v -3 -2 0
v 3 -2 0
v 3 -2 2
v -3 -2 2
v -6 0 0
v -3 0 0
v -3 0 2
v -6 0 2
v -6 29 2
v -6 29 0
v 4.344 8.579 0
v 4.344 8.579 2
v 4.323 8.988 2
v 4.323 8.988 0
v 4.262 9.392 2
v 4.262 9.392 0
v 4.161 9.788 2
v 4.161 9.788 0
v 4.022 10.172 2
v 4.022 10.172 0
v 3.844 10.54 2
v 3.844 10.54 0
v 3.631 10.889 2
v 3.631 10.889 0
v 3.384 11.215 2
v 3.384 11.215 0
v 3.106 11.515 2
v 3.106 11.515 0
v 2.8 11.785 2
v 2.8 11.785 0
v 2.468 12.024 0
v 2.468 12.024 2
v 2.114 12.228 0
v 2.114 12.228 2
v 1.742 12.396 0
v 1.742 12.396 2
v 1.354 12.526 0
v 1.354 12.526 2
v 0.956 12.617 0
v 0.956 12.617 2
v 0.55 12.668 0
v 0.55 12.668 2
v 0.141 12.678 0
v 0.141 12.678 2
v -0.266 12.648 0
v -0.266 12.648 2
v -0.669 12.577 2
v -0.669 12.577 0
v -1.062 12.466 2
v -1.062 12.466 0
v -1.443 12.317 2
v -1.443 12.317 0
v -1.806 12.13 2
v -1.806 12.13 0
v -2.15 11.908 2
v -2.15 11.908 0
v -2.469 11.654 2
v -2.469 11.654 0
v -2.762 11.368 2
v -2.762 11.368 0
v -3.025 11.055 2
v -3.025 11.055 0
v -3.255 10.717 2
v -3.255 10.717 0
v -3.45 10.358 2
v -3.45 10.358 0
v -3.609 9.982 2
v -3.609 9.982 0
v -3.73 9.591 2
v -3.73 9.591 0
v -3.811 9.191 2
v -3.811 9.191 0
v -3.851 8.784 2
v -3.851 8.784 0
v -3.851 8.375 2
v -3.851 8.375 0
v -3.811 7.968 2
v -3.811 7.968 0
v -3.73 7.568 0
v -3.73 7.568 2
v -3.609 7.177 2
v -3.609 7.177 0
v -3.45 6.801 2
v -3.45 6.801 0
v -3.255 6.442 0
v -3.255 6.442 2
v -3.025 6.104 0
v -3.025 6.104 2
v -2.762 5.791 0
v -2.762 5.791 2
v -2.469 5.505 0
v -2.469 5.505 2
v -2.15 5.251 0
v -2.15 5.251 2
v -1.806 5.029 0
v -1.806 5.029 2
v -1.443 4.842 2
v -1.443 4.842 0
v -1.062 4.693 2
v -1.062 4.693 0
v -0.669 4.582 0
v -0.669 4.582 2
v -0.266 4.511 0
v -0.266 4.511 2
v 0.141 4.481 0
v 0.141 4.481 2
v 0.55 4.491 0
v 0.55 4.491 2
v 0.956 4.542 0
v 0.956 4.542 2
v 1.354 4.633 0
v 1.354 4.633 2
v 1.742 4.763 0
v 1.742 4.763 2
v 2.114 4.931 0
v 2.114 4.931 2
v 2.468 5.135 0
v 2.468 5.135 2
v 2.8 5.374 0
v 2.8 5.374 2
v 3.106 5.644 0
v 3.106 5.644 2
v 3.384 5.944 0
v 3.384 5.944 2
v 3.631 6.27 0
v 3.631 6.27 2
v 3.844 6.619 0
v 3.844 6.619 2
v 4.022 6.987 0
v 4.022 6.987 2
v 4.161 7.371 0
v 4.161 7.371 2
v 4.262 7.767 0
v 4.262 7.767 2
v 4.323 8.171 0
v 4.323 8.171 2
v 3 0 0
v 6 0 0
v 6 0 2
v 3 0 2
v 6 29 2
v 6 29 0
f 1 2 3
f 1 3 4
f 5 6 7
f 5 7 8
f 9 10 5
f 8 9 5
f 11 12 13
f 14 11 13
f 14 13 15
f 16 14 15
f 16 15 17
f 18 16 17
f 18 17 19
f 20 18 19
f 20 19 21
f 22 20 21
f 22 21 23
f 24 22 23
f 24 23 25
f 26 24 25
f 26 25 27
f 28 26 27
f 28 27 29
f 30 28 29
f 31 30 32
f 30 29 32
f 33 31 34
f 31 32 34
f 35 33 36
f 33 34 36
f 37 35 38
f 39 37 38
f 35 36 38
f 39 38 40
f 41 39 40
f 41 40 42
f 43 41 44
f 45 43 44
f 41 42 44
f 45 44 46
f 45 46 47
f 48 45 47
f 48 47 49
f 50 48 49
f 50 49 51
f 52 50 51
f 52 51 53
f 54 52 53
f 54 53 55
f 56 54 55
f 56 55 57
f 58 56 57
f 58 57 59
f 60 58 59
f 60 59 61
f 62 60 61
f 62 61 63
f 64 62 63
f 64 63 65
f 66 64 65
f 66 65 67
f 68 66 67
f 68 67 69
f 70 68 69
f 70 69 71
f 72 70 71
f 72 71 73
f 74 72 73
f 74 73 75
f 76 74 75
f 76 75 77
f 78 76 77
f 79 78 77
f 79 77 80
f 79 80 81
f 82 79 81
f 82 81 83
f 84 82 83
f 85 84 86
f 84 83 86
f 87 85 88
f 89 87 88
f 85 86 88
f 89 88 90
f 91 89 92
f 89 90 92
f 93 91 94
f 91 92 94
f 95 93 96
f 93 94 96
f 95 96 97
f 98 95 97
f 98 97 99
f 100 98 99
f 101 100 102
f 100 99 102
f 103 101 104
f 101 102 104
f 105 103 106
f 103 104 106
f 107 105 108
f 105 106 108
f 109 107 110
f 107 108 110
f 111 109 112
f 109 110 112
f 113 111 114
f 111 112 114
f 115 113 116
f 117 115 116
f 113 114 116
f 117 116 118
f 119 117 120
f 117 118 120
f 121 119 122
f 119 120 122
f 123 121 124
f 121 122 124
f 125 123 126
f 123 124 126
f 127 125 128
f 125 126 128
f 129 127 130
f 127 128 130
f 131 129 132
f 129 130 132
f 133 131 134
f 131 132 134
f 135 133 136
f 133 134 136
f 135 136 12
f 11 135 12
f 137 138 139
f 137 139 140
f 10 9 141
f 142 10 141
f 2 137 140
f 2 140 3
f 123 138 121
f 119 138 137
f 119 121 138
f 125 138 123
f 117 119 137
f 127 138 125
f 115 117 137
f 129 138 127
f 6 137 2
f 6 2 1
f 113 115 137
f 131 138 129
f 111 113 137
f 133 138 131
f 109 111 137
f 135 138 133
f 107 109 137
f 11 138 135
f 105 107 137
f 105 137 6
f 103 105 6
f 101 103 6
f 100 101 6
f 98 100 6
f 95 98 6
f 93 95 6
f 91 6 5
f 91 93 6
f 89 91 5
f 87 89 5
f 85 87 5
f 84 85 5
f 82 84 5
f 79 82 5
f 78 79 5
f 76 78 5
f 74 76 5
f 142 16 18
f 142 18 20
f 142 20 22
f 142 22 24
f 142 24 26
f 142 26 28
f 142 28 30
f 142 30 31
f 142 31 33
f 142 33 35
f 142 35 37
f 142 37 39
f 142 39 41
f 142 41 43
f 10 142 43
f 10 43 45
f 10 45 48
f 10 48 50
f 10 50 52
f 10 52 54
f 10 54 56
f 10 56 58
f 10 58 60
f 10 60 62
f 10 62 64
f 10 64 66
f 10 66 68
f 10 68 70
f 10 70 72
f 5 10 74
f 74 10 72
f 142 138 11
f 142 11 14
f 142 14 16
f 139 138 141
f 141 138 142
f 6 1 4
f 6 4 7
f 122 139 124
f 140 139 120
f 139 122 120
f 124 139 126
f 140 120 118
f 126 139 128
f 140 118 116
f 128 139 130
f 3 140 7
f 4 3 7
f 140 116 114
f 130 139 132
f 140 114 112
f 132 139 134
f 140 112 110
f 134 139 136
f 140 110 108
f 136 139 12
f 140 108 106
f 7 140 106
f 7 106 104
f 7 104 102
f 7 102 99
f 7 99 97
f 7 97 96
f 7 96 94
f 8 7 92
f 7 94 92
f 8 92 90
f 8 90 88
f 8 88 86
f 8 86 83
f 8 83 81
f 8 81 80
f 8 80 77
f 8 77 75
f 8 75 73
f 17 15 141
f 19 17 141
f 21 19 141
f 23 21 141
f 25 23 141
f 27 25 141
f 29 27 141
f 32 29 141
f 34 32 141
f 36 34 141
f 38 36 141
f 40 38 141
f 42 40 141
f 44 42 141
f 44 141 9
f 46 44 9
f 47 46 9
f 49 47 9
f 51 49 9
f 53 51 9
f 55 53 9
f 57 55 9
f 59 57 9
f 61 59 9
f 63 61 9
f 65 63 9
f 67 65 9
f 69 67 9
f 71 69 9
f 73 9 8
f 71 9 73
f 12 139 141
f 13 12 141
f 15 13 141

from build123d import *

# Parameters (mm, degrees)
EXTRUDE_1_DEPTH     = 2
SKETCH_2_R          = 4.1
CUT_EXTRUDE_1_DEPTH = 10
SKETCH_3_W          = 12
SKETCH_3_H          = 1.078774048
CUT_EXTRUDE_2_DEPTH = 10


with BuildPart() as part:
    # 草图1 → 凸台-拉伸1 (new body)
    with BuildSketch(Plane.XY):
        Polygon((-6, 0), (-6, 15), (-6, 30.078774409), (6, 30.078774409), (6, 15), (6, 0), (3, 0), (3, -2), (-3, -2), (-3, 0), align=None)
    extrude(amount=EXTRUDE_1_DEPTH)

    # 草图2 → 切除-拉伸1 (cut)
    with BuildSketch(Plane.XY.offset(2)):
        with Locations((0.243619751, 8.579446227)):
            Circle(SKETCH_2_R)
    extrude(amount=-CUT_EXTRUDE_1_DEPTH, mode=Mode.SUBTRACT)

    # 草图3 → 切除-拉伸2 (cut)
    with BuildSketch(Plane.XY.offset(2)):
        with Locations((0, 29.539387385)):
            Rectangle(SKETCH_3_W, SKETCH_3_H)
        Polygon((6, 29.000000361), (10.298878861, 29.000000361), (10.298878861, 34.143483695), (-9.585000786, 34.143483695), (-9.585000786, 29.000000361), (-6, 29.000000361), (-6, 30.078774409), (6, 30.078774409), align=None)
    extrude(amount=-CUT_EXTRUDE_2_DEPTH, mode=Mode.SUBTRACT)


solid = part.part
